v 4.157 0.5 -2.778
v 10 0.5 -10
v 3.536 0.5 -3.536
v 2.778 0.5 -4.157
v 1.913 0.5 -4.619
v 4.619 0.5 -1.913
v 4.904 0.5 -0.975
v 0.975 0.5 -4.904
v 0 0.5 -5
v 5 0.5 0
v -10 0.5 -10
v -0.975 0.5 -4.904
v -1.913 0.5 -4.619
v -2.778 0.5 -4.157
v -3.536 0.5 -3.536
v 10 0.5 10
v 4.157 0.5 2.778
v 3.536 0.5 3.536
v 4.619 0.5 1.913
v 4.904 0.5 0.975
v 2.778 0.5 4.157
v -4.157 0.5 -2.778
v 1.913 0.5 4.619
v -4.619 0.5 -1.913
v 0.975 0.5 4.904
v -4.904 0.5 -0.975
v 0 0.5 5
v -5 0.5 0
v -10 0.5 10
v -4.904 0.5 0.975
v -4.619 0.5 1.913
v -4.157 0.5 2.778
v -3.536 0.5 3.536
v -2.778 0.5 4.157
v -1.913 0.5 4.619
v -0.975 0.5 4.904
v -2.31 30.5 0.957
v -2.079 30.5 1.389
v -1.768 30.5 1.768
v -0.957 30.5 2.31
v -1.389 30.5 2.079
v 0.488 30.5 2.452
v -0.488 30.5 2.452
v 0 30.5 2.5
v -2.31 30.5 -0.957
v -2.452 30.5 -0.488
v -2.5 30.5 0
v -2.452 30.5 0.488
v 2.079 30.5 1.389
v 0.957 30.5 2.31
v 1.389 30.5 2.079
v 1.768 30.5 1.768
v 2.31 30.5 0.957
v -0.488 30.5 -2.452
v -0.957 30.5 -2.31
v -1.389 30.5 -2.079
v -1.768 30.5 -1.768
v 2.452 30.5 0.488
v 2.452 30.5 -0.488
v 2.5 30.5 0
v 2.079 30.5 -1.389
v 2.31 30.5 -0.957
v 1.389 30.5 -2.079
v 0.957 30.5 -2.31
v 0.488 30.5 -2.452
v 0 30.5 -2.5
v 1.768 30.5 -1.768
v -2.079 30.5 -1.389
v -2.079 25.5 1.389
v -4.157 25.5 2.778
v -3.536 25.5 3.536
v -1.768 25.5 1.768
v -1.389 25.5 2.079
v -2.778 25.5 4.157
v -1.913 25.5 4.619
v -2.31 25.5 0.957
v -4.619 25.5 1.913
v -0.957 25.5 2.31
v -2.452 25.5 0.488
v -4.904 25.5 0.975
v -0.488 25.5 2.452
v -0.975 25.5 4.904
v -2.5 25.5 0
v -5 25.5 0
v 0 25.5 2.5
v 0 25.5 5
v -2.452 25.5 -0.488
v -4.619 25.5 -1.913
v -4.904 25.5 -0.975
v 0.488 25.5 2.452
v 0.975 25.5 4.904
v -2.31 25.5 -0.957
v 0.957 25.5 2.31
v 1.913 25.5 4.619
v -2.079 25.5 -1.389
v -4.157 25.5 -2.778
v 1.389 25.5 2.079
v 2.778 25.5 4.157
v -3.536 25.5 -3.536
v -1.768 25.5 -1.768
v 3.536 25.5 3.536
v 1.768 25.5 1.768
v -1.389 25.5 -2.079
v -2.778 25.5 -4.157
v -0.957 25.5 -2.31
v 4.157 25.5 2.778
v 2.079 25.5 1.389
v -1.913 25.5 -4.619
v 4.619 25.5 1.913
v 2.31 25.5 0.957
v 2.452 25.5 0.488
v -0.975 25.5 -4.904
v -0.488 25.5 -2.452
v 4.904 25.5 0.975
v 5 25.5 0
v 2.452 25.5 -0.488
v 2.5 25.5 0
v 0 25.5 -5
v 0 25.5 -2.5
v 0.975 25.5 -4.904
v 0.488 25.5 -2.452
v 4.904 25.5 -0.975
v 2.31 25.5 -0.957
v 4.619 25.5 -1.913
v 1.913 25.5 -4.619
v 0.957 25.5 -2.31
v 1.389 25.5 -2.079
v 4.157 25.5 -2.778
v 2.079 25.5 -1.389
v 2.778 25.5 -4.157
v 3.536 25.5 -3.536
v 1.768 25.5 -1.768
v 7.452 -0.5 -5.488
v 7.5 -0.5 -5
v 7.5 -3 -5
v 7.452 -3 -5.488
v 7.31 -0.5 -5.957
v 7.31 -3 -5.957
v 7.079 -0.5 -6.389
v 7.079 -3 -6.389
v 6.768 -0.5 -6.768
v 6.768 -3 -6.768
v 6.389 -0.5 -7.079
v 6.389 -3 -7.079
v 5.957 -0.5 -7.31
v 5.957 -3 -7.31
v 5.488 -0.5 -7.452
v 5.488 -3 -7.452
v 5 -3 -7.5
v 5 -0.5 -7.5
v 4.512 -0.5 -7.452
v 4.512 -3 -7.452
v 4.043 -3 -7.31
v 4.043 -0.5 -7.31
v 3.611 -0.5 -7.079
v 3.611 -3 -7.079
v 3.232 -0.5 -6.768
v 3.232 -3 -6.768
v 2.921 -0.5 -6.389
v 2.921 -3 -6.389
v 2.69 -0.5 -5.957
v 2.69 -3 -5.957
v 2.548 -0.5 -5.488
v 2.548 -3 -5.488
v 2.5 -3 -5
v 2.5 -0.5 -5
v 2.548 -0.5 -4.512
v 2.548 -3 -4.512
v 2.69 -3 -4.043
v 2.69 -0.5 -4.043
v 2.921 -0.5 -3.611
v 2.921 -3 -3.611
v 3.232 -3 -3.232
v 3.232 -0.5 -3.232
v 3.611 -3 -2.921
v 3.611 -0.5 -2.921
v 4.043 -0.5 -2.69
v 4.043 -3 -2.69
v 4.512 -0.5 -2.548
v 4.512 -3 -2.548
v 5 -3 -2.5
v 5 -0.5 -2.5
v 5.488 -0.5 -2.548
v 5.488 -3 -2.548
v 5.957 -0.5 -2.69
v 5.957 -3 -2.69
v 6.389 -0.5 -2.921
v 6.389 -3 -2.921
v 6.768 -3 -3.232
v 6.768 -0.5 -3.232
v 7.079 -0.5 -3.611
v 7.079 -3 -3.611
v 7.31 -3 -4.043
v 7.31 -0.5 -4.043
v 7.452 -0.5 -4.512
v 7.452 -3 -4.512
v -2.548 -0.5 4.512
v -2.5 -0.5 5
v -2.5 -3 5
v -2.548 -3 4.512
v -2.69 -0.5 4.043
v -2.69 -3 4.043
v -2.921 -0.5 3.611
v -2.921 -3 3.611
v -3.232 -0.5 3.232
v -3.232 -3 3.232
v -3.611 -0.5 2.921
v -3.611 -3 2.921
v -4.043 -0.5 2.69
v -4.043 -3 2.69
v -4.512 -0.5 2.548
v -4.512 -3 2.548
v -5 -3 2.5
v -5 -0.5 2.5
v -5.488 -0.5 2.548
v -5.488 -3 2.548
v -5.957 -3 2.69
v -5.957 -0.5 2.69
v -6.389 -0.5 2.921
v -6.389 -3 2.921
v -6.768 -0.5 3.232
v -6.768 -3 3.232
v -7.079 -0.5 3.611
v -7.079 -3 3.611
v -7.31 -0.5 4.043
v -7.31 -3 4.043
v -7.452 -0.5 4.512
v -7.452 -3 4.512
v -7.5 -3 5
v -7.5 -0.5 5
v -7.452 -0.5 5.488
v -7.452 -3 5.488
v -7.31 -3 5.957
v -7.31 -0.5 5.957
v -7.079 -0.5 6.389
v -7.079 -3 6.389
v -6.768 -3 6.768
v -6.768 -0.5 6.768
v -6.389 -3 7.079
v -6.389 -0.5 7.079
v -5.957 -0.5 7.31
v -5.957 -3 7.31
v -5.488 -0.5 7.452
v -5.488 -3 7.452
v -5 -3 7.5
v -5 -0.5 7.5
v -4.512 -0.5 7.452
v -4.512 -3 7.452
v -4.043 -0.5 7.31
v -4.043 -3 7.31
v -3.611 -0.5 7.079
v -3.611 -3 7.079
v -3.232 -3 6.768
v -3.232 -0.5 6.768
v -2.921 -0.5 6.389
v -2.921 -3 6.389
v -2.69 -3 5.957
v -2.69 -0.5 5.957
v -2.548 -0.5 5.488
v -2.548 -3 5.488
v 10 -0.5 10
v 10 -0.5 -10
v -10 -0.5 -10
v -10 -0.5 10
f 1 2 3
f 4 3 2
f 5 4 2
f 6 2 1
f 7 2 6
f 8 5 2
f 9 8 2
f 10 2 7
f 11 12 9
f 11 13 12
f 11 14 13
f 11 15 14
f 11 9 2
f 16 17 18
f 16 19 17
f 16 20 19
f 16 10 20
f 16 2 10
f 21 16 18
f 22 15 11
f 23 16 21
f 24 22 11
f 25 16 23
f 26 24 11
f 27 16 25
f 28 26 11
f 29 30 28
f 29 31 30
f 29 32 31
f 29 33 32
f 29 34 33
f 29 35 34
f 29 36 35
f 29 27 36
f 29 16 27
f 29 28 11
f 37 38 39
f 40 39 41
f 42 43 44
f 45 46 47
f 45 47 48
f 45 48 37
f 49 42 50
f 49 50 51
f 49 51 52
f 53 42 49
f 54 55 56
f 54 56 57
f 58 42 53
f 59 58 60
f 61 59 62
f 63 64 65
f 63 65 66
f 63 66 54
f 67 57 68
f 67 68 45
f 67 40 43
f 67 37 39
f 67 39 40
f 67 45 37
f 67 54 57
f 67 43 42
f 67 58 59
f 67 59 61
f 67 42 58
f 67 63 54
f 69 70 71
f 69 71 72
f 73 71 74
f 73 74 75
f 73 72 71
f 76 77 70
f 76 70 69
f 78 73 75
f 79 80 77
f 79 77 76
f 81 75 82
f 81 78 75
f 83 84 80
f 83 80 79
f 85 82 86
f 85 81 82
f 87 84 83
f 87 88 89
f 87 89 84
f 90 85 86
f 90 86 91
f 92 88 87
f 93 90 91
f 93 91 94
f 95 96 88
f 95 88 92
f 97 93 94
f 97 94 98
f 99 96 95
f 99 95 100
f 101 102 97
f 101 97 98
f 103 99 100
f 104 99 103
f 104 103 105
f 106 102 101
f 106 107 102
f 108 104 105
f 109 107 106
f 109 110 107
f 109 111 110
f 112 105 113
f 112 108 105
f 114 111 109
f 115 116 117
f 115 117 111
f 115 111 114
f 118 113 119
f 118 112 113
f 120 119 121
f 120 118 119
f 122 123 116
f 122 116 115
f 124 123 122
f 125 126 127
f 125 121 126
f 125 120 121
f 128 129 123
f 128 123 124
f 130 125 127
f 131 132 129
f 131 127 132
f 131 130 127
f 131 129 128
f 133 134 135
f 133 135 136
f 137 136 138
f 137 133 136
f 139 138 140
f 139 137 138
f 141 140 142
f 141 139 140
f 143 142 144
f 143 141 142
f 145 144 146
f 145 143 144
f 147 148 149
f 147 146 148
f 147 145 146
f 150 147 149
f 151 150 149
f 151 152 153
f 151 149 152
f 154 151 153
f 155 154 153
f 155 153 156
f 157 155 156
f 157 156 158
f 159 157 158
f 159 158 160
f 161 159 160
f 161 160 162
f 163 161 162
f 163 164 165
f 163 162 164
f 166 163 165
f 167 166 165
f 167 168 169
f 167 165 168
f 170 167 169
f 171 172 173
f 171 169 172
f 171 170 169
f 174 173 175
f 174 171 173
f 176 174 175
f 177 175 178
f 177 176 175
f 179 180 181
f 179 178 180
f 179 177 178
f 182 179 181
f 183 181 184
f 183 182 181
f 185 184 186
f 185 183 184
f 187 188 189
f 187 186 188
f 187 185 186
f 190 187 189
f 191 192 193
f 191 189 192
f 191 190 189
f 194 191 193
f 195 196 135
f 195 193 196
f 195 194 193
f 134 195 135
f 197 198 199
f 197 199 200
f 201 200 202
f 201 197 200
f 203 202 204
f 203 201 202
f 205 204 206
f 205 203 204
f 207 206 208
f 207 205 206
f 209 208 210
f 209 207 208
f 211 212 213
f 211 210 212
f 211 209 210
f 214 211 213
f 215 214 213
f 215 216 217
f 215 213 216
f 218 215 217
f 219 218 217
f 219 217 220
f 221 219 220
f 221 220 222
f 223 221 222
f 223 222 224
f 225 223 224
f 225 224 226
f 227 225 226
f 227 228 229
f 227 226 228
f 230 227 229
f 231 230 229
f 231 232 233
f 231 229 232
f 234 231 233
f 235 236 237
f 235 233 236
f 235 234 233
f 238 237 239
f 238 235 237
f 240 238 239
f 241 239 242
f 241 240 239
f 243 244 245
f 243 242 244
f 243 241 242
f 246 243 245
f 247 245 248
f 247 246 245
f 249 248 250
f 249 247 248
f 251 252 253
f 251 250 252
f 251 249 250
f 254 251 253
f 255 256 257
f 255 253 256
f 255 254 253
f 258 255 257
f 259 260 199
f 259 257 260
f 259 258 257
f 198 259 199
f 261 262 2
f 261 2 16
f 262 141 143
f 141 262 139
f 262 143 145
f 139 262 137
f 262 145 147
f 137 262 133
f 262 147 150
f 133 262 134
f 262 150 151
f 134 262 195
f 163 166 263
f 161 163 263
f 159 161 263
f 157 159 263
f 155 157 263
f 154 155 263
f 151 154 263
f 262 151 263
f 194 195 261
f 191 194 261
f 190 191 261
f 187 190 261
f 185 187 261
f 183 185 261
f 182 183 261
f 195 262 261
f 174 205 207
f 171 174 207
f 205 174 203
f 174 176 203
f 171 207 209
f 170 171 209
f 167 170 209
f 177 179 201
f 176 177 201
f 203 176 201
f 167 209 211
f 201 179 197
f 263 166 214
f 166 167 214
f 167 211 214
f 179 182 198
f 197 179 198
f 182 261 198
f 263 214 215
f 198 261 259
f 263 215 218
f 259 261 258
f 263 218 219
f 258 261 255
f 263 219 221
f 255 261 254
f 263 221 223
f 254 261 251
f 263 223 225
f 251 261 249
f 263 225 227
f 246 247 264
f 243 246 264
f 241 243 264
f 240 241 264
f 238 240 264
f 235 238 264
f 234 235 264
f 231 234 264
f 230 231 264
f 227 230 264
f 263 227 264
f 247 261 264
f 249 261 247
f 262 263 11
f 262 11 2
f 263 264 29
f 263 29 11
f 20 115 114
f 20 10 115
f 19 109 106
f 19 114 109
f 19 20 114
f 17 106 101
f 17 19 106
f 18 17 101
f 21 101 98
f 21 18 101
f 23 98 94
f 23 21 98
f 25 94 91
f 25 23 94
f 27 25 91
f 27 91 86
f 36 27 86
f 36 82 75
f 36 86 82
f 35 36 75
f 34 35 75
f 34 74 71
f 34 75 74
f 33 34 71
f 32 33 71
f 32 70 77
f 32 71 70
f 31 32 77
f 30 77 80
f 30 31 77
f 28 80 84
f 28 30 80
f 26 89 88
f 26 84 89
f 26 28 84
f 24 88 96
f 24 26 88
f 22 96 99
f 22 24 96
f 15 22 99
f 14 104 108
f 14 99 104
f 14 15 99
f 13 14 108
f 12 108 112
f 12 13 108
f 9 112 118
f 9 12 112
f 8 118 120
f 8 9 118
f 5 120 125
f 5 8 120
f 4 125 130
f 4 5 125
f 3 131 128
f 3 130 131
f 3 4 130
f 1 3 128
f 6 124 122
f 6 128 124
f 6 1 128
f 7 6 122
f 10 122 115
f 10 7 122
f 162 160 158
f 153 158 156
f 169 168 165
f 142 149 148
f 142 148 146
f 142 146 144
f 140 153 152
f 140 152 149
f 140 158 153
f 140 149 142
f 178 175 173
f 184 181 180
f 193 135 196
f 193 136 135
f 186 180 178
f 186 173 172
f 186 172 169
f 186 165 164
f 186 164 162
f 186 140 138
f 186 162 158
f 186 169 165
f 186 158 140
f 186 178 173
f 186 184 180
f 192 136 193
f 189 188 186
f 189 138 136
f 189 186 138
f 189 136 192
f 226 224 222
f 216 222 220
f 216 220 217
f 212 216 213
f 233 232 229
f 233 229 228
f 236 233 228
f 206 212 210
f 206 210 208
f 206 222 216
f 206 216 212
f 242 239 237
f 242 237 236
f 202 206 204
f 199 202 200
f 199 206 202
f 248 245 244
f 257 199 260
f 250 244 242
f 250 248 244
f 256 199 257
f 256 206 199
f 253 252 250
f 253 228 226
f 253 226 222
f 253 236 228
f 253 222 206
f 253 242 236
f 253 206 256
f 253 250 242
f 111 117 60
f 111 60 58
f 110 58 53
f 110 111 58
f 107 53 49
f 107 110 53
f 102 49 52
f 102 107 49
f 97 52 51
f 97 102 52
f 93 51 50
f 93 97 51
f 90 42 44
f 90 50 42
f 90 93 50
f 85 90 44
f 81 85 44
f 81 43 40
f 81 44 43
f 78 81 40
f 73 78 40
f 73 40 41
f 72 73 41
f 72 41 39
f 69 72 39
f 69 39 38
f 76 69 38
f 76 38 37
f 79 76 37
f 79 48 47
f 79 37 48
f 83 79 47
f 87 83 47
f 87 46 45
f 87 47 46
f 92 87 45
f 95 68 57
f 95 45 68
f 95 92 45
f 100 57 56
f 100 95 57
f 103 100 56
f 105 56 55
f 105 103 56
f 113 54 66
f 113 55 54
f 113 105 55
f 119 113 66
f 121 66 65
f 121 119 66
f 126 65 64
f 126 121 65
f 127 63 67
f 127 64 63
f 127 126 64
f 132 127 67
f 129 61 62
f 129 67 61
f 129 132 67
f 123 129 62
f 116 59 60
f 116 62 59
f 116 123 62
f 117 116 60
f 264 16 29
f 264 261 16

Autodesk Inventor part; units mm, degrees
sketch "Sketch1" plane through (0, 0, 0) normal (0, 1, 0) x (-1, 0, 0)
  line L0 (10, -10) -> (-10, -10)
  line L1 (-10, -10) -> (-10, 10)
  line L2 (-10, 10) -> (10, 10)
  line L3 (10, 10) -> (10, -10)
  line L4 (0, -13.825) -> (0, 13.825) projected
  line L5 (-14, 0) -> (14, 0) projected
  point P0 (0, 0)
  point P1 (0, -10)
  point P2 (10, 0)
  dimension "d0" = 20
  dimension "d1" = 20
extrude "Extrusion1" add sketch "Sketch1" along normal mid plane 1
sketch "Sketch2" plane through (0, -0.5, 0) normal (0, -1, 0) x (1, 0, 0)
  circle A0 centre (-5, 5) radius 2.5
  line L0 (10, 10) -> (-10, 10) projected
  line L1 (-10, 10) -> (-10, -10) projected
  circle A1 centre (5, -5) radius 2.5
  point P0 (0, 0)
  dimension "d4" = 5
  dimension "d5" = 5
  dimension "d6" = 5
  dimension "d9" = 360
extrude "Extrusion2" add sketch "Sketch2" along normal blind 2.5
sketch "Sketch3" plane through (0, 0.5, 0) normal (0, 1, 0) x (1, 0, 0)
  circle A0 centre (0, 0) radius 5
  dimension "d13" = 10
extrude "Extrusion3" add sketch "Sketch3" along normal blind 25
sketch "Sketch7" plane through (0, 25.5, 0) normal (0, 1, 0) x (1, 0, 0)
  circle A0 centre (0, 0) radius 2.5
  dimension "d50" = 5
extrude "Extrusion4" add sketch "Sketch7" along normal blind 5
properties part number "Tree_Trunk"
